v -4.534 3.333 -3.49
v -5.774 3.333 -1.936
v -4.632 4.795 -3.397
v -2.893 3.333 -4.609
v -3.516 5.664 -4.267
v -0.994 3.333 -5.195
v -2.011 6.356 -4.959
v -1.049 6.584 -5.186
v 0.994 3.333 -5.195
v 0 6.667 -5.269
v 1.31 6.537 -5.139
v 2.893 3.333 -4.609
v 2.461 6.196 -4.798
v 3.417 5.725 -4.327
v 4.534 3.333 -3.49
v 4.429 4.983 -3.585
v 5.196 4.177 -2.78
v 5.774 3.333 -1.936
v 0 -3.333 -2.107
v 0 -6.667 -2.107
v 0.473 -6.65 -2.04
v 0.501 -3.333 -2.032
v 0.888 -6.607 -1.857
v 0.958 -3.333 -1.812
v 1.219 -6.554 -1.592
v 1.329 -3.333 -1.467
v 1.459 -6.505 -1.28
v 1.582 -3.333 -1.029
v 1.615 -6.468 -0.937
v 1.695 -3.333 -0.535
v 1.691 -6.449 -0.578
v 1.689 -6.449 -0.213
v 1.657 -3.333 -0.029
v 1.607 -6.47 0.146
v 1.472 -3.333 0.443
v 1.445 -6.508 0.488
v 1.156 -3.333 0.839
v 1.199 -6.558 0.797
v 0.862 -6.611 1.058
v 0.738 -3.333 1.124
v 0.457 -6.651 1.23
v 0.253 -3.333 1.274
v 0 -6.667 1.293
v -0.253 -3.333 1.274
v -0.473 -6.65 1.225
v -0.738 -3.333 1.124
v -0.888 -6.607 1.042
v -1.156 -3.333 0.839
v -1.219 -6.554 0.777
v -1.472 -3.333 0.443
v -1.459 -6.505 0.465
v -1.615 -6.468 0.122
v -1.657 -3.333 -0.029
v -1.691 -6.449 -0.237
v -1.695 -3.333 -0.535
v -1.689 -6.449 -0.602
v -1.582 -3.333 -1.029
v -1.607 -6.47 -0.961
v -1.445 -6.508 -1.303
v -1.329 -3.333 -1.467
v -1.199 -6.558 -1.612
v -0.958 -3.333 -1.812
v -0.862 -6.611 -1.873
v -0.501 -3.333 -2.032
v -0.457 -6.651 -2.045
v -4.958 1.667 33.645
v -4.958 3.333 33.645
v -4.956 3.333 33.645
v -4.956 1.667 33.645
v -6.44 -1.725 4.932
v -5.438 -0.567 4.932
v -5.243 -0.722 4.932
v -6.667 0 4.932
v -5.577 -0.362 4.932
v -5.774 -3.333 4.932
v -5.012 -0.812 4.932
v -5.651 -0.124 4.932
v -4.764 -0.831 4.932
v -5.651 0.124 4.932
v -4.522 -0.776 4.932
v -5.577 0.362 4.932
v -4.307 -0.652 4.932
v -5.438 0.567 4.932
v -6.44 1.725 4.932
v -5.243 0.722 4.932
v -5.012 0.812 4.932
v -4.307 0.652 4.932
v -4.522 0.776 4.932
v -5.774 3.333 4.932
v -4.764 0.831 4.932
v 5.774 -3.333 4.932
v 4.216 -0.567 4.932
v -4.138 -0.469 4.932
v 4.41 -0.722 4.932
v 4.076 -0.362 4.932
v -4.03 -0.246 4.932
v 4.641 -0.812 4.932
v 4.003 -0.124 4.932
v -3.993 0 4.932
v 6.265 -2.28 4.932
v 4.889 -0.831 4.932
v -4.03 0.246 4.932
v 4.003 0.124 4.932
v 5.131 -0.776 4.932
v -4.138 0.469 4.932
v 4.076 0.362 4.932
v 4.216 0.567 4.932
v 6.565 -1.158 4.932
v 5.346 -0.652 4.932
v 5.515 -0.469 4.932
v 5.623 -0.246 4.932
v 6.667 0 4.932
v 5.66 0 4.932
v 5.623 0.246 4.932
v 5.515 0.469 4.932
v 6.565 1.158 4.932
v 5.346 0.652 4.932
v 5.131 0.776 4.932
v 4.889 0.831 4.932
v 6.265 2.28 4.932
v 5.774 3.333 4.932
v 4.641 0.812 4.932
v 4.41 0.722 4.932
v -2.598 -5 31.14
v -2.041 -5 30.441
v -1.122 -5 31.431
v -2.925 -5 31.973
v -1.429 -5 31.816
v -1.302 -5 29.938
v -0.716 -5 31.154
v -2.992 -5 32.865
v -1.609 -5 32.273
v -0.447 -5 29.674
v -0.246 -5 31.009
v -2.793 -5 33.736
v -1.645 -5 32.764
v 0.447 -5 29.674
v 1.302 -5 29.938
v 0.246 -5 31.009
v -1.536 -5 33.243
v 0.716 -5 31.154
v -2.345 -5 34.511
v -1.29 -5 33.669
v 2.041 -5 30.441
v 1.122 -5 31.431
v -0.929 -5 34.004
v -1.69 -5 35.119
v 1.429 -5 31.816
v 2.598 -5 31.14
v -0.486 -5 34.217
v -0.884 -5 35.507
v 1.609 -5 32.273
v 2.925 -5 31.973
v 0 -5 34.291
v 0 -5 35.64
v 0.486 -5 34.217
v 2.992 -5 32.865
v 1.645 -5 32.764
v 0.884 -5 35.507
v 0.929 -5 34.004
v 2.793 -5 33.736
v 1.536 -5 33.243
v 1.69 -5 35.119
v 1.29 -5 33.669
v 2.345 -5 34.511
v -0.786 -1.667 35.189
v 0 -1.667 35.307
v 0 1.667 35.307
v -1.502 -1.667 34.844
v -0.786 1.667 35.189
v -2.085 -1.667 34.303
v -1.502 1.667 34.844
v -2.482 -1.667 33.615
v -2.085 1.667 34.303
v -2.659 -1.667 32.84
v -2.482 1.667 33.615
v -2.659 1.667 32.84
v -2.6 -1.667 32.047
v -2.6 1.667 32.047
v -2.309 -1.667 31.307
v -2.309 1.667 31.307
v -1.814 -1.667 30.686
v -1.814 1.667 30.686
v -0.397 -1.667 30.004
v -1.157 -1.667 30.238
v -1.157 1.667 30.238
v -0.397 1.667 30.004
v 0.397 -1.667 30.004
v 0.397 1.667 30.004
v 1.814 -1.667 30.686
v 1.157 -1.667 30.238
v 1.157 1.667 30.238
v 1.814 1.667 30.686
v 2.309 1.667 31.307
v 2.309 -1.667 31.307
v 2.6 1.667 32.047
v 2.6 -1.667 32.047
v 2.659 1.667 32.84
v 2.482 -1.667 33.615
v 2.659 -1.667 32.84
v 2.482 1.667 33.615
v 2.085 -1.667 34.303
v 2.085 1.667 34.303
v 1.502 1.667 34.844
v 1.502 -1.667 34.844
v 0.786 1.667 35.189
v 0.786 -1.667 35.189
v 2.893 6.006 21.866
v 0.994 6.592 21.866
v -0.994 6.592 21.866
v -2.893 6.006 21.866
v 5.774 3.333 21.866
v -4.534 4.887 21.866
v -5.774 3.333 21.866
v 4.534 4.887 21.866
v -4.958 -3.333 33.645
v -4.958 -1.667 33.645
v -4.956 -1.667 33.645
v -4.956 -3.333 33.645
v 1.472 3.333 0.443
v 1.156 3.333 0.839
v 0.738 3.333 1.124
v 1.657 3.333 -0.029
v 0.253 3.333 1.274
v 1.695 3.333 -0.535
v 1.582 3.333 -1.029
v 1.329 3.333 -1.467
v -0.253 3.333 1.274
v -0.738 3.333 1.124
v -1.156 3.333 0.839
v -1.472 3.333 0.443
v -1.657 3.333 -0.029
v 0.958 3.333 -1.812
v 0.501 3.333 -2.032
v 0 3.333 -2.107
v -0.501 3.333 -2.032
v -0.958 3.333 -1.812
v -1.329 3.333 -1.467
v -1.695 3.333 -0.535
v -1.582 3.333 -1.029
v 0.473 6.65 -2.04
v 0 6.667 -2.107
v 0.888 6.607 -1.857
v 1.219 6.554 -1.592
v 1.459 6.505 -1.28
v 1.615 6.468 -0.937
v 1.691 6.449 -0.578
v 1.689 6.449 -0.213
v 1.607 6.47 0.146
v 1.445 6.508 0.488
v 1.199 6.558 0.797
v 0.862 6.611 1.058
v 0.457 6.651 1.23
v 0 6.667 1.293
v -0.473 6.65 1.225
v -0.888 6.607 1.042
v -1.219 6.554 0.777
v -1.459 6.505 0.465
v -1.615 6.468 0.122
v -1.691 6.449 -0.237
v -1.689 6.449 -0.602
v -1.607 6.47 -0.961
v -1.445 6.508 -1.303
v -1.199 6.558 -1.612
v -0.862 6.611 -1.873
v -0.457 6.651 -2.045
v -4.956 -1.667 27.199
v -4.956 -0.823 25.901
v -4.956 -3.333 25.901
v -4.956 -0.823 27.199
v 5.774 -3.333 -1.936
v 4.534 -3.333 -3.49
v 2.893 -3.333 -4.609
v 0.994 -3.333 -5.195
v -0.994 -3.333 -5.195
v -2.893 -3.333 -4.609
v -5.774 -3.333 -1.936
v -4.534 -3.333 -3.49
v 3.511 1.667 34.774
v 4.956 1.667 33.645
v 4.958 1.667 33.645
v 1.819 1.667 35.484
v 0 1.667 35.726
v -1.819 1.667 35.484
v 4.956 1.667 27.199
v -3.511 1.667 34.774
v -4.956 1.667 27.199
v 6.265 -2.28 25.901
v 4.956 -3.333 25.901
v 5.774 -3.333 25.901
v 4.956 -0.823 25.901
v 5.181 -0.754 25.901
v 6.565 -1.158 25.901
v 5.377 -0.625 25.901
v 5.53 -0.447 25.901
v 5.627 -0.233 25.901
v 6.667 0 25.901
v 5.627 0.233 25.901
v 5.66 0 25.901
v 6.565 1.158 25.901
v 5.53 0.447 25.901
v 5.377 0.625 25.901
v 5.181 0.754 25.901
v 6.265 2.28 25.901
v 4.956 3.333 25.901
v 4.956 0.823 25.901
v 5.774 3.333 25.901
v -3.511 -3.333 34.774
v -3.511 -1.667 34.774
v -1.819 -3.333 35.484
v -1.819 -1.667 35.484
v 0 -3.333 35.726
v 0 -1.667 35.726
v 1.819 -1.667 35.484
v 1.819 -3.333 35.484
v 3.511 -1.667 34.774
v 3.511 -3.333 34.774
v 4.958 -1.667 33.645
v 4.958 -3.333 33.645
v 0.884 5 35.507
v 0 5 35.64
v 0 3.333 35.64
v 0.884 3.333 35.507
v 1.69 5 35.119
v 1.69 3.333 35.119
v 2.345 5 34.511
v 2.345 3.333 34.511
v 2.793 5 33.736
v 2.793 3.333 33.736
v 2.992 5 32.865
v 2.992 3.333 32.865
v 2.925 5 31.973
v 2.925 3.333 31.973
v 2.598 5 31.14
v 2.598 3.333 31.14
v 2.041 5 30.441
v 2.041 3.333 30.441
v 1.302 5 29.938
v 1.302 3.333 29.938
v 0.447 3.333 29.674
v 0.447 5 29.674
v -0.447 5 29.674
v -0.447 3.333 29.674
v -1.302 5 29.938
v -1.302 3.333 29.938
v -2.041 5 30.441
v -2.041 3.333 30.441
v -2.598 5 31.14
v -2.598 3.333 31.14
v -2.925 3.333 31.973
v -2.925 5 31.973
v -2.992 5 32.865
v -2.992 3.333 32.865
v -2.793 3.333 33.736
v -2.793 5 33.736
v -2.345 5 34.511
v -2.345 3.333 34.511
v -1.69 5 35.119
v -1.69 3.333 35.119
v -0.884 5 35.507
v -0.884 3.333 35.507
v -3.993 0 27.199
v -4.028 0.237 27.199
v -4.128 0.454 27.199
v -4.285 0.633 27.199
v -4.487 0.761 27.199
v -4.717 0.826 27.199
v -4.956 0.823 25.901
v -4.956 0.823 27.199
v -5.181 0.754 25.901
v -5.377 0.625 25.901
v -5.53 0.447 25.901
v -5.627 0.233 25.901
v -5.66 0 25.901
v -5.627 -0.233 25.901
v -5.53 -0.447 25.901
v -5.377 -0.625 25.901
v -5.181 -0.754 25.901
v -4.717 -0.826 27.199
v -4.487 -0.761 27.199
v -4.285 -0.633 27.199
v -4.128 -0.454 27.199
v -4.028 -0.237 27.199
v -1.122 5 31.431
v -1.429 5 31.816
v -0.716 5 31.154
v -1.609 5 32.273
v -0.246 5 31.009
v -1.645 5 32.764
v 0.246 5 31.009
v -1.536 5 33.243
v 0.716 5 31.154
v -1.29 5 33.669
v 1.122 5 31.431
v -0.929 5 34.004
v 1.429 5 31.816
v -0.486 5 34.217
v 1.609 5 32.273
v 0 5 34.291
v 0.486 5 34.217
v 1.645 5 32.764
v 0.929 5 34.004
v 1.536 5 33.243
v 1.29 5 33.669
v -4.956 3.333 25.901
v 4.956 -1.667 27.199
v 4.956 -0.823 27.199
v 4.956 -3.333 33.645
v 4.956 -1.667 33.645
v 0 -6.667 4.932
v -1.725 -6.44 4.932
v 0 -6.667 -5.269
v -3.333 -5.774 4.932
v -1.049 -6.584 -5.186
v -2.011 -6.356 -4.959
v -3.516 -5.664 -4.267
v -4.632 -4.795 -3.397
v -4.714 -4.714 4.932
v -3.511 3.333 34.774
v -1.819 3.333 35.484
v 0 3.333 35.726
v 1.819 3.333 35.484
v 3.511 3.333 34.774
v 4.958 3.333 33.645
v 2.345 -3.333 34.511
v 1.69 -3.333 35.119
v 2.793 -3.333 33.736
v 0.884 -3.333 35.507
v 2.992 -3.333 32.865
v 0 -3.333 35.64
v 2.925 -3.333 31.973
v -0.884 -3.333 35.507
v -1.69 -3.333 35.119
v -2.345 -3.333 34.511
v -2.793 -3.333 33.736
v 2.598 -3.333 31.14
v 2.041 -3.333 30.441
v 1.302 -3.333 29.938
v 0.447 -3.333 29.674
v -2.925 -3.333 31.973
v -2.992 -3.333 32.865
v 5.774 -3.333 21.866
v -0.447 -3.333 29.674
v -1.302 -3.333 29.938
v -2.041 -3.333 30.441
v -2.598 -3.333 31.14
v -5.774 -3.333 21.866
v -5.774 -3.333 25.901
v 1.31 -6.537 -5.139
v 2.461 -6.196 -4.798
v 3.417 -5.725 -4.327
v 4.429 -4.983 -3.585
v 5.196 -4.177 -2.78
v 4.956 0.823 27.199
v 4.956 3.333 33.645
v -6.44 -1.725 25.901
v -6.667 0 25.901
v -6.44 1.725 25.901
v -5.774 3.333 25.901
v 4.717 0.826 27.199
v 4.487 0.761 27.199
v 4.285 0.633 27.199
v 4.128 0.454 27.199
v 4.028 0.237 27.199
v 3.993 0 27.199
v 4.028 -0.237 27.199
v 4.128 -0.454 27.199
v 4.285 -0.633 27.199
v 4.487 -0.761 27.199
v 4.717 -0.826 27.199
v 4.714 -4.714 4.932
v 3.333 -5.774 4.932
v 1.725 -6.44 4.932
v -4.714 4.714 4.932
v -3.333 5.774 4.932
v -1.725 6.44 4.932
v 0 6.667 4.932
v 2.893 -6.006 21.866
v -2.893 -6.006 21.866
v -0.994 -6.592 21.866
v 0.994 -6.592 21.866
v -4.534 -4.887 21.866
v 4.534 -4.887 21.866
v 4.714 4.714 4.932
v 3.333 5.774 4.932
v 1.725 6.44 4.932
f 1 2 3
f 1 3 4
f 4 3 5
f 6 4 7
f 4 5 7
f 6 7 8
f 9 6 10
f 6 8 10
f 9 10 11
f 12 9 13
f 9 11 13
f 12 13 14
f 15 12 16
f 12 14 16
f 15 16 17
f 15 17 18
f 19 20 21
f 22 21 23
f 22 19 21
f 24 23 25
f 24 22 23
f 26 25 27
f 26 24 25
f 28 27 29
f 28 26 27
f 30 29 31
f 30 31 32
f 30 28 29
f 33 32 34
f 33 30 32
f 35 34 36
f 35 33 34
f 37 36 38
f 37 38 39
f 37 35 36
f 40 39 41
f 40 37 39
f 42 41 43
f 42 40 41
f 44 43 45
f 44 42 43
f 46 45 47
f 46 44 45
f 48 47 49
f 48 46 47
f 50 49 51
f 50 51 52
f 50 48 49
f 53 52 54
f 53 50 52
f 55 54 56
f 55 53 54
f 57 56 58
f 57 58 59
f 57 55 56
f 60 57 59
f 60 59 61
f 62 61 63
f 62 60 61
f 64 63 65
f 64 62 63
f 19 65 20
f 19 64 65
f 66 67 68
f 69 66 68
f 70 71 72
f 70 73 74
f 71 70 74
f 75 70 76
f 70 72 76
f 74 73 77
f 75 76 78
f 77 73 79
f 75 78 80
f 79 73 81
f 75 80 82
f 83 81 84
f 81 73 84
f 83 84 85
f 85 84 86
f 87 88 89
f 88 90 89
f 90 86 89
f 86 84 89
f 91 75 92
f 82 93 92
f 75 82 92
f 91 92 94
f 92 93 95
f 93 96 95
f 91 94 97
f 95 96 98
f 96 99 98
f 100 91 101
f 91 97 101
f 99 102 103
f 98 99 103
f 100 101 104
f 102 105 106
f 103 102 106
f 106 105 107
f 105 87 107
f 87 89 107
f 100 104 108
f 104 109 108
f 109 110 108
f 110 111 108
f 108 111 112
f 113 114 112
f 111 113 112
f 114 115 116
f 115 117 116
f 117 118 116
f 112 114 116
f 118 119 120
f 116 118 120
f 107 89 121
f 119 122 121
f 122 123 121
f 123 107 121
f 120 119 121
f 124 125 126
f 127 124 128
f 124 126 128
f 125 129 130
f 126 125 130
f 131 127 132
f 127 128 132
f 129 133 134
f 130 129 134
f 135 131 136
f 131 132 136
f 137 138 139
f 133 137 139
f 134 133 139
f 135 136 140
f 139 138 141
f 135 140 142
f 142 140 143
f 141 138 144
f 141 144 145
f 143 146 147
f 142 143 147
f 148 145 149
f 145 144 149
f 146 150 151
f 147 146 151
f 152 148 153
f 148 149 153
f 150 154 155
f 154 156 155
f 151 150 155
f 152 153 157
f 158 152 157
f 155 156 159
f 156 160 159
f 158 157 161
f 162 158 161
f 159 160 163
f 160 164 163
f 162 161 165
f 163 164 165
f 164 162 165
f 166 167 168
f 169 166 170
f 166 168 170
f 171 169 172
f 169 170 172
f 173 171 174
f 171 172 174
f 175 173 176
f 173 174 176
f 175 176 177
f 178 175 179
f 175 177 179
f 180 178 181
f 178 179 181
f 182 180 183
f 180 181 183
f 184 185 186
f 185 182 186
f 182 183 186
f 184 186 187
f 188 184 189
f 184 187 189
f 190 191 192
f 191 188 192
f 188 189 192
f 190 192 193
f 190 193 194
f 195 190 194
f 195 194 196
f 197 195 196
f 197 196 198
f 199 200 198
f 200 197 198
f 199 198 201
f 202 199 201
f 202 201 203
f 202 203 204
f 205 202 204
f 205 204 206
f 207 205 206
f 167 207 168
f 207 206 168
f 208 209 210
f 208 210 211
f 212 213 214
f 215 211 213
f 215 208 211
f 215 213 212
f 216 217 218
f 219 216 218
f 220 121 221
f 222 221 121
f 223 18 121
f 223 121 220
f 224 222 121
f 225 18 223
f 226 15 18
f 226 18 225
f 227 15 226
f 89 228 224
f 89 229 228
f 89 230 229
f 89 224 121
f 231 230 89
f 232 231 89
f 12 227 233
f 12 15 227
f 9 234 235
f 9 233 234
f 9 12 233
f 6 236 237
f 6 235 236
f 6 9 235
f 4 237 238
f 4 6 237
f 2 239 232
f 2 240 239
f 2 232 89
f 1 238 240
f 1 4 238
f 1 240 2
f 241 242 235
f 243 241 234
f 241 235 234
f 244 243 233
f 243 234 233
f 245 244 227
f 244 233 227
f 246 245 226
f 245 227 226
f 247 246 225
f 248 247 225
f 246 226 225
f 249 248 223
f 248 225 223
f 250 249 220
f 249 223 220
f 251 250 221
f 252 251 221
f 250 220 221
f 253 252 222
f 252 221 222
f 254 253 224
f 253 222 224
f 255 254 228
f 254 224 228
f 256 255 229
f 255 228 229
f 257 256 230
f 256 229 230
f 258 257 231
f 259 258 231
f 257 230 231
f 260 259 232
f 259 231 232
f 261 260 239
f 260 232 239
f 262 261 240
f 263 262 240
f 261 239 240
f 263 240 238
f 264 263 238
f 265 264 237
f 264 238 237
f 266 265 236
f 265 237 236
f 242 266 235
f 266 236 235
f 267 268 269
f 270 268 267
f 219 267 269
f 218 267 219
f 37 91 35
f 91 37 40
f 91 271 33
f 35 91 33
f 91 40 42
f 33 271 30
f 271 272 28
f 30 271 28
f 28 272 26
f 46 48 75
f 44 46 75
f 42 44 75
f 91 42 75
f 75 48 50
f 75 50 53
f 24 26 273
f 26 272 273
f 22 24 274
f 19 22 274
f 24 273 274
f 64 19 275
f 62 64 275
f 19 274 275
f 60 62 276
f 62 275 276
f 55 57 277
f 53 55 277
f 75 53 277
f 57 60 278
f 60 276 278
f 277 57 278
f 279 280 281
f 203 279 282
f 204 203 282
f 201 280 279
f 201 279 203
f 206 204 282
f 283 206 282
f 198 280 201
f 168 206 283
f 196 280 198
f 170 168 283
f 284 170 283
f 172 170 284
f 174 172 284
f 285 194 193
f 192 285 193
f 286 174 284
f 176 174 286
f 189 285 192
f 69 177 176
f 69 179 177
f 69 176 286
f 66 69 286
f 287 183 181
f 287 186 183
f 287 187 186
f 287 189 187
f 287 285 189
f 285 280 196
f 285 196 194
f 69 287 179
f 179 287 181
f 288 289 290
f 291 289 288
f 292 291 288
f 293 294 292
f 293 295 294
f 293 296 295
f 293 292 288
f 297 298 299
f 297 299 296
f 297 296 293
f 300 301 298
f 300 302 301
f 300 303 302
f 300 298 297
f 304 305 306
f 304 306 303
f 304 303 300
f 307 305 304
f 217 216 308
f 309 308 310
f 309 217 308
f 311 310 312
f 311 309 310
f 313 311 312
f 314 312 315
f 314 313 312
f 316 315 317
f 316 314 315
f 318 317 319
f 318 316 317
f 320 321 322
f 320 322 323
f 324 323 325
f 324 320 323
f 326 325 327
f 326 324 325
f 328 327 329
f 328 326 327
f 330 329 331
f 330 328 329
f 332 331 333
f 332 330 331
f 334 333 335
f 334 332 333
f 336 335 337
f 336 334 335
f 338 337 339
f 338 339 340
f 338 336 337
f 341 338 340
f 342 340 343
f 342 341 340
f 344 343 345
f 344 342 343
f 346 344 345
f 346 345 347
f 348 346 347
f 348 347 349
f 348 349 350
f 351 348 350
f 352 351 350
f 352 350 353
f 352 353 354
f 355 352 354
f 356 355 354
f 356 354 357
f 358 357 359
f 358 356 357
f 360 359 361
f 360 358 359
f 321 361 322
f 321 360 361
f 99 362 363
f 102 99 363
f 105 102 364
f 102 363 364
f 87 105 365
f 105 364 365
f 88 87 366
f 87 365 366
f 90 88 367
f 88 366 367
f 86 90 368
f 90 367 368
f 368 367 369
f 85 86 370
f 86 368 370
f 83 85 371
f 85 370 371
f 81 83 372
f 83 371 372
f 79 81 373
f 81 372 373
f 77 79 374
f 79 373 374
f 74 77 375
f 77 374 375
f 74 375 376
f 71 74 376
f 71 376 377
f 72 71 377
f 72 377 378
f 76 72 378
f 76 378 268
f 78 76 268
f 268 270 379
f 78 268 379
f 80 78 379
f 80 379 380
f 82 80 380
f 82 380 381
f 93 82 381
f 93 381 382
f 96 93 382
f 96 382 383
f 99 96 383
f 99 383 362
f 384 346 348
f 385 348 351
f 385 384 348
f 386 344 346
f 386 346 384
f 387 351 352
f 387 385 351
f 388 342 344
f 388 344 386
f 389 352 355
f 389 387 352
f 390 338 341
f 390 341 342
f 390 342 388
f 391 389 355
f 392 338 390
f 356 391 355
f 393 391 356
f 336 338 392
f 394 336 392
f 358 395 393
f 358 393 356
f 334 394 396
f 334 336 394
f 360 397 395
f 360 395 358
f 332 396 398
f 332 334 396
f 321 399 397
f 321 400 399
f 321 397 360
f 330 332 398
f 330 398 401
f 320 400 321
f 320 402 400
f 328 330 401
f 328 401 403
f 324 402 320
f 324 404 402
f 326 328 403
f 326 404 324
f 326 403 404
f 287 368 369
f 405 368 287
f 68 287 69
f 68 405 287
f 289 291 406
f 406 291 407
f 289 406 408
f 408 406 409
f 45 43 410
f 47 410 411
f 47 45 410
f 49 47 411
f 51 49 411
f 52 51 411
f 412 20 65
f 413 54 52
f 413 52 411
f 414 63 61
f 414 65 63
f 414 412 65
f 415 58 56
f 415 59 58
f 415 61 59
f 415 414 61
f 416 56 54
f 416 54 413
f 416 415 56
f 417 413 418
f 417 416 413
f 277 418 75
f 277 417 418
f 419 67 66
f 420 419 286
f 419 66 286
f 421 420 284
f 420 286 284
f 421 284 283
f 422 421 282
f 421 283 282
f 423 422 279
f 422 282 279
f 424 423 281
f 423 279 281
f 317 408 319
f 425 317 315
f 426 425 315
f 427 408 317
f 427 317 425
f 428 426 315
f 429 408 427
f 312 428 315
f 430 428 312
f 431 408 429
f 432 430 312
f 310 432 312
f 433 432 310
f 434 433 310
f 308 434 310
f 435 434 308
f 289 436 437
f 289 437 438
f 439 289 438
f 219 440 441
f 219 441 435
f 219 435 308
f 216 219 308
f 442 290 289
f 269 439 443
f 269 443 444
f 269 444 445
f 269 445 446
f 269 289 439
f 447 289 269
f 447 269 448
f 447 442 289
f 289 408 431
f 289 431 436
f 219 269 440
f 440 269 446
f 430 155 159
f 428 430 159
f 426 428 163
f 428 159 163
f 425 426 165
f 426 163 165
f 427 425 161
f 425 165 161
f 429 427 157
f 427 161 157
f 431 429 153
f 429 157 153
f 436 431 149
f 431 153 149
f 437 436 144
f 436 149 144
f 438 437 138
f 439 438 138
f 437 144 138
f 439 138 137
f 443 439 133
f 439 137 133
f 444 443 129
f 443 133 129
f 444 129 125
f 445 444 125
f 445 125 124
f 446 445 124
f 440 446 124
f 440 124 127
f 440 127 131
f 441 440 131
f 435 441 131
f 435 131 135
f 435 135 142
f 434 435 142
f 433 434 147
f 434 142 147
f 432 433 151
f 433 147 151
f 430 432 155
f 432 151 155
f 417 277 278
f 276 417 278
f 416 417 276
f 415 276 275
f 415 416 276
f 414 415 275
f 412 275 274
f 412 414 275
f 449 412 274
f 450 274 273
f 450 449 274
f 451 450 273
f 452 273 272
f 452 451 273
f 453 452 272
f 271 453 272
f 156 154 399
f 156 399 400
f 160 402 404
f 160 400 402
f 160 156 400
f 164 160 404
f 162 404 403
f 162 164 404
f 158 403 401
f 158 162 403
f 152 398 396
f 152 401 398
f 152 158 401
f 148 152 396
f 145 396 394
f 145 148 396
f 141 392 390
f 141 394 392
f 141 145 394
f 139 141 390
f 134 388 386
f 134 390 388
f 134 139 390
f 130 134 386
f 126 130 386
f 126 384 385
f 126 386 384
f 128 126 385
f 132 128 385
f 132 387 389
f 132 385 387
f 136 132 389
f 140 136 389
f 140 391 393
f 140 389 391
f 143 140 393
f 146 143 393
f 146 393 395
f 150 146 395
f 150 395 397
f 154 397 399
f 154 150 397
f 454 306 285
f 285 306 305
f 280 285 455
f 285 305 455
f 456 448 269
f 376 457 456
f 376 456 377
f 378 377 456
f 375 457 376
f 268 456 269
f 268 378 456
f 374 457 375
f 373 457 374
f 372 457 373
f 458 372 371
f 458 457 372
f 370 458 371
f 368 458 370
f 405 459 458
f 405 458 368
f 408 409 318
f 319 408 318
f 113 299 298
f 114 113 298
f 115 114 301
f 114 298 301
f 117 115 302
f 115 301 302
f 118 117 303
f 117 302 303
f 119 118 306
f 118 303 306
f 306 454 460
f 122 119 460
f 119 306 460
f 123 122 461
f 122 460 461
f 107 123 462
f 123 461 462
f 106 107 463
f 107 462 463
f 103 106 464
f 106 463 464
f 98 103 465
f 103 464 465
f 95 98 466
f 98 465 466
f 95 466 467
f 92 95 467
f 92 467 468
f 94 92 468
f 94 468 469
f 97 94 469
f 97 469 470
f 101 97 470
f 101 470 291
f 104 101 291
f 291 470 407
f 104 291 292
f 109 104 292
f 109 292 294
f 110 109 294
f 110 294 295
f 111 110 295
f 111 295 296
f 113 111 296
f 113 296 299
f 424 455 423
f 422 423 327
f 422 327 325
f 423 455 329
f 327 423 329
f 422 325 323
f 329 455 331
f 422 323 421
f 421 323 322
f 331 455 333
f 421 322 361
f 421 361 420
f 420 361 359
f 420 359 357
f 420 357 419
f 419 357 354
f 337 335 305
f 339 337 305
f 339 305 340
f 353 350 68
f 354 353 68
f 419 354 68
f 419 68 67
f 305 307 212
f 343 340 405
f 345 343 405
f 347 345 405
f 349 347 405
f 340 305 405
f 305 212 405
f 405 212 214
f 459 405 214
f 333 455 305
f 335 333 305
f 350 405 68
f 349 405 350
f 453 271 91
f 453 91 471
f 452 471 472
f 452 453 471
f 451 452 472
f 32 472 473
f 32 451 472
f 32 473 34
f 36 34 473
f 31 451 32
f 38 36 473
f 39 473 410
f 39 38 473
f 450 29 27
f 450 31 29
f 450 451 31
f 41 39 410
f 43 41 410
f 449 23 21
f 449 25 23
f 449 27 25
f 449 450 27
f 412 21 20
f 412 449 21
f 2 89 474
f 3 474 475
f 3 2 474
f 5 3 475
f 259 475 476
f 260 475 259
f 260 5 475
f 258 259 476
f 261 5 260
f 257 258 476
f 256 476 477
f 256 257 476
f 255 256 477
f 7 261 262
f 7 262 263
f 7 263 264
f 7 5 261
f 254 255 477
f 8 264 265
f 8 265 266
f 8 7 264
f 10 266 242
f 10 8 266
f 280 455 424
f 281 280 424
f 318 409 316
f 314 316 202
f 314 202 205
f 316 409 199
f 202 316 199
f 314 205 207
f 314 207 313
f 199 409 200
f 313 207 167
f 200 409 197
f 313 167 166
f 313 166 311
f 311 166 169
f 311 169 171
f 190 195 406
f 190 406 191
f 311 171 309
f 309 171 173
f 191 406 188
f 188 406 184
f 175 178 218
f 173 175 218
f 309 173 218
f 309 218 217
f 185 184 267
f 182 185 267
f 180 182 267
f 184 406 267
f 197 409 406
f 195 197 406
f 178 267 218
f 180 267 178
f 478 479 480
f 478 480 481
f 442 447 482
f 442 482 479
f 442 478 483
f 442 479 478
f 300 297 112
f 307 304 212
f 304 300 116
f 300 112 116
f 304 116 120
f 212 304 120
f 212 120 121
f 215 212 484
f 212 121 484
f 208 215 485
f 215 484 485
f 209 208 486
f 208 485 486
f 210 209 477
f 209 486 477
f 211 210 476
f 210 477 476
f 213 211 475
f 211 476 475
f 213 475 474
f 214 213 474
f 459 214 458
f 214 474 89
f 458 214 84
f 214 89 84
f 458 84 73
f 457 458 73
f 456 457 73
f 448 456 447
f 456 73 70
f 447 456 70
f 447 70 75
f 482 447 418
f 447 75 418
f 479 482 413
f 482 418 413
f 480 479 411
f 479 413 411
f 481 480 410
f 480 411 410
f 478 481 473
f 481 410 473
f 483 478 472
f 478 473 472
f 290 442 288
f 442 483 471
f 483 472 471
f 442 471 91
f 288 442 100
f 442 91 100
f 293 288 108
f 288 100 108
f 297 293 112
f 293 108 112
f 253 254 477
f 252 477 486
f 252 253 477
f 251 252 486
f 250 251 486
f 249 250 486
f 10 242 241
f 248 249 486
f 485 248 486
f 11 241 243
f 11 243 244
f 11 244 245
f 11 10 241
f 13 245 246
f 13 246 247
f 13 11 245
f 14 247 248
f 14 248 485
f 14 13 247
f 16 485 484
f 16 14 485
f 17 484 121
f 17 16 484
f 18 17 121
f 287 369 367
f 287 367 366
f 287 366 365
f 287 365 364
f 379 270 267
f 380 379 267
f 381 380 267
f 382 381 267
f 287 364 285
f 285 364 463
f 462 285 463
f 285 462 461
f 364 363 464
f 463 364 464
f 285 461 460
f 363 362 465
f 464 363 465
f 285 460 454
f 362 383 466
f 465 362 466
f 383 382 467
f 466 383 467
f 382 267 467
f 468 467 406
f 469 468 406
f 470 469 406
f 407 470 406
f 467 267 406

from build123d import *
from build123d.topology import SkipClean

# Parameters (mm, degrees)
SKETCH2_R                       = 10
PHALANGE_LENGTH_DEPTH           = 33.4
BOSS_EXTRUDE3_DEPTH             = 5
BOSS_EXTRUDE4_DEPTH             = 5
BOSS_EXTRUDE4_DEPTH_BACK        = 5
CUT_EXTRUDE2_START              = -15.3025
CUT_EXTRUDE2_DEPTH              = 15.3025
SKETCH7_R                       = 1.65
CUT_EXTRUDE3_DEPTH              = 10
CUT_EXTRUDE4_DEPTH              = 2.5
CUT_EXTRUDE4_DEPTH_BACK         = 2.5
CUT_EXTRUDE7_REACH              = 53.978
SKETCH4_R                       = 1.65
CUT_EXTRUDE7_DIRECTION_2_REACH  = 53.978
CUT_EXTRUDE_THIN1_START         = 33.4
CUT_EXTRUDE_THIN1_DEPTH         = 10.361670454
BOSS_EXTRUDE5_REACH             = 53.313
SKETCH9_R                       = 4
SKETCH9_R_2                     = 1.65
CUT_EXTRUDE8_REACH              = 52.714
SKETCH10_R                      = 1.25
CUT_EXTRUDE9_START              = -8
CUT_EXTRUDE9_DEPTH              = 8
CUT_EXTRUDE10_REACH             = 53.313
CUT_EXTRUDE10_DIRECTION_2_REACH = 53.313
CUT_EXTRUDE11_START             = -10
CUT_EXTRUDE11_OUTLINE_W         = 2.565773848
CUT_EXTRUDE11_OUTLINE_H         = 11.6166929
CUT_EXTRUDE11_DEPTH             = 10
BOSS_EXTRUDE6_START             = 7.5
SKETCH14_R                      = 4.5
SKETCH14_R_2                    = 1.65
BOSS_EXTRUDE6_DEPTH             = 2.5
BOSS_EXTRUDE7_START             = -7.5
SKETCH14_2_R                    = 4.5
SKETCH14_2_R_2                  = 1.65
BOSS_EXTRUDE7_DEPTH             = 2.5
SCALE1_SCALE                    = 0.666666667
CUT_EXTRUDE12_START             = -11.666667
SKETCH15_R                      = 1.65
CUT_EXTRUDE12_DEPTH             = 13.333339
CUT_EXTRUDE13_REACH             = 39.694
SKETCH16_R                      = 1.7
CUT_EXTRUDE13_DIRECTION_2_REACH = 39.694


# Read off the part's stored shape, not the designer's step: Cut-Extrude-Thin1, Cut-Extrude11
with BuildPart() as part:
    # Sketch2 → Phalange Length (new body)
    with BuildSketch(Plane.XY):
        Circle(SKETCH2_R)
    extrude(amount=PHALANGE_LENGTH_DEPTH)

    # Sketch3 → Boss-Extrude3 (add)
    with BuildSketch(Plane(origin=(0, -10, 0), x_dir=(-1, 0, 0), z_dir=(0, -1, 0))):
        with BuildLine():
            Line((-10, 5.302499701), (-10, 0))
            Line((-10, 0), (10, 0))
            Line((10, 0), (10, 5.302499701))
            ThreePointArc((10, 5.302499701), (0, 15.302499701), (-10, 5.302499701))
        make_face()
    boss_extrude3 = extrude(amount=-BOSS_EXTRUDE3_DEPTH)

    # Mirror1: Boss-Extrude3 across plane
    add(boss_extrude3.mirror(Plane.ZX))

    # Sketch5 → Boss-Extrude4 (add, two sides: drawn at the far end of the back side and taken through both)
    with BuildSketch(Plane(origin=(0, 0, 0), x_dir=(1, 0, 0), z_dir=(0, 1, 0)).offset(-BOSS_EXTRUDE4_DEPTH_BACK)):
        with BuildLine():
            Line((-10, -39.183157911), (-10, -33.4))
            Line((-10, -33.4), (10, -33.4))
            Line((10, -33.4), (10, -39.183157911))
            ThreePointArc((10, -39.183157911), (0, -48.751984156), (-10, -39.183157911))
        make_face()
    extrude(amount=BOSS_EXTRUDE4_DEPTH + BOSS_EXTRUDE4_DEPTH_BACK)

    # Sketch6 → Cut-Extrude2 (cut)
    with SkipClean():  # the faces are left unmerged after this step: merging them gives an invalid solid
        with BuildSketch(Plane.XY.offset(CUT_EXTRUDE2_START)):
            with BuildLine():
                ThreePointArc((0, 10), (5, 8.660254038), (8.660254038, 5))
                Line((8.660254038, 5), (10, 5))
                Line((10, 5), (10, 10))
                Line((10, 10), (0, 10))
            make_face()
            with BuildLine():
                Line((10, -5), (8.660254038, -5))
                ThreePointArc((8.660254038, -5), (5, -8.660254038), (0, -10))
                Line((0, -10), (10, -10))
                Line((10, -10), (10, -5))
            make_face()
            with BuildLine():
                ThreePointArc((-8.660254038, 5), (-5, 8.660254038), (0, 10))
                Line((0, 10), (-10, 10))
                Line((-10, 10), (-10, 5))
                Line((-10, 5), (-8.660254038, 5))
            make_face()
            with BuildLine():
                Line((-10, -10), (0, -10))
                ThreePointArc((0, -10), (-5, -8.660254038), (-8.660254038, -5))
                Line((-8.660254038, -5), (-10, -5))
                Line((-10, -5), (-10, -10))
            make_face()
        extrude(amount=CUT_EXTRUDE2_DEPTH, mode=Mode.SUBTRACT)

    # Sketch7 → Cut-Extrude3 (cut)
    with SkipClean():  # the faces are left unmerged after this step: merging them gives an invalid solid
        with BuildSketch(Plane(origin=(0, 5, 0), x_dir=(1, 0, 0), z_dir=(0, 1, 0))):
            with Locations(Location((0, -41.561984156, 0), (0, 0, 270))):
                Circle(SKETCH7_R)
        extrude(amount=-CUT_EXTRUDE3_DEPTH, mode=Mode.SUBTRACT)

    # Sketch5<2> → Cut-Extrude4 (cut, two sides: drawn at the far end of the back side and taken through both)
    with BuildSketch(Plane(origin=(0, 0, 0), x_dir=(1, 0, 0), z_dir=(0, 1, 0)).offset(-CUT_EXTRUDE4_DEPTH_BACK)):
        with BuildLine():
            Line((-10, -39.183157911), (-10, -33.4))
            Line((-10, -33.4), (10, -33.4))
            Line((10, -33.4), (10, -39.183157911))
            ThreePointArc((10, -39.183157911), (0, -48.751984156), (-10, -39.183157911))
        make_face()
    extrude(amount=CUT_EXTRUDE4_DEPTH + CUT_EXTRUDE4_DEPTH_BACK, mode=Mode.SUBTRACT)

    # Sketch4 → Cut-Extrude7 (cut, up to next)
    with BuildSketch(Plane(origin=(0, -5, 0), x_dir=(1, 0, 0), z_dir=(0, 1, 0)), mode=Mode.PRIVATE) as cut_extrude7_sk1:
        with Locations(Location((0, 8.010159673, 0), (0, 0, 270))):
            Circle(SKETCH4_R)
    cut_extrude7_tool1 = extrude(cut_extrude7_sk1.sketch, amount=-CUT_EXTRUDE7_REACH, mode=Mode.PRIVATE) & part.part
    add(cut_extrude7_tool1.solids().sort_by_distance((0, -5, -8.01016))[0], mode=Mode.SUBTRACT)

    # Sketch4 → Cut-Extrude7 direction 2 (cut, up to next)
    with BuildSketch(Plane(origin=(0, -5, 0), x_dir=(1, 0, 0), z_dir=(0, 1, 0)), mode=Mode.PRIVATE) as cut_extrude7_direction_2_sk1:
        with Locations(Location((0, 8.010159673, 0), (0, 0, 270))):
            Circle(SKETCH4_R)
    cut_extrude7_direction_2_tool1 = extrude(cut_extrude7_direction_2_sk1.sketch, amount=CUT_EXTRUDE7_DIRECTION_2_REACH, mode=Mode.PRIVATE) & part.part
    add(cut_extrude7_direction_2_tool1.solids().sort_by_distance((0, -5, -8.01016))[0], mode=Mode.SUBTRACT)

    # Cut-Extrude-Thin1 outline → Cut-Extrude-Thin1 (cut)
    with SkipClean():  # the faces are left unmerged after this step: merging them gives an invalid solid
        with BuildSketch(Plane.XY.offset(CUT_EXTRUDE_THIN1_START)):
            with BuildLine():
                ThreePointArc((8.660254038, 5), (9.256147934, 3.78466979), (9.682458366, 2.5))
                Line((9.682458366, 2.5), (10, 2.5))
                Line((10, 2.5), (10, 5))
                Line((10, 5), (8.660254038, 5))
            make_face()
            with BuildLine():
                Line((10, -2.5), (9.682458366, -2.5))
                ThreePointArc((9.682458366, -2.5), (9.256147934, -3.78466979), (8.660254038, -5))
                Line((8.660254038, -5), (10, -5))
                Line((10, -5), (10, -2.5))
            make_face()
            with BuildLine():
                Line((-10, 2.5), (-9.682458366, 2.5))
                ThreePointArc((-9.682458366, 2.5), (-9.256147934, 3.78466979), (-8.660254038, 5))
                Line((-8.660254038, 5), (-10, 5))
                Line((-10, 5), (-10, 2.5))
            make_face()
            with BuildLine():
                ThreePointArc((-8.660254038, -5), (-9.256147934, -3.78466979), (-9.682458366, -2.5))
                Line((-9.682458366, -2.5), (-10, -2.5))
                Line((-10, -2.5), (-10, -5))
                Line((-10, -5), (-8.660254038, -5))
            make_face()
        extrude(amount=CUT_EXTRUDE_THIN1_DEPTH, mode=Mode.SUBTRACT)

    # Sketch9 → Boss-Extrude5 (add, up to next)
    with BuildSketch(Plane.XZ.offset(-2.5), mode=Mode.PRIVATE) as boss_extrude5_sk1:
        with Locations(Location((0, 41.561984156, 0), (0, 0, 90))):
            Circle(SKETCH9_R)
        with Locations(Location((0, 41.561984156, 0), (0, 0, 90))):
            Circle(SKETCH9_R_2, mode=Mode.SUBTRACT)
    boss_extrude5_tool1 = extrude(boss_extrude5_sk1.sketch, amount=BOSS_EXTRUDE5_REACH, mode=Mode.PRIVATE) - part.part
    add(boss_extrude5_tool1.solids().sort_by_distance((0, 2.5, 37.675121))[0])

    # Sketch10 → Cut-Extrude8 (cut, up to next)
    with BuildSketch(Plane.XY.offset(33.4), mode=Mode.PRIVATE) as cut_extrude8_sk1:
        with Locations((7.239961745, 0)):
            Circle(SKETCH10_R)
    cut_extrude8_tool1 = extrude(cut_extrude8_sk1.sketch, amount=-CUT_EXTRUDE8_REACH, mode=Mode.PRIVATE) & part.part
    # Sketch10 → Cut-Extrude8 (cut, up to next)
    with BuildSketch(Plane.XY.offset(33.4), mode=Mode.PRIVATE) as cut_extrude8_sk2:
        with Locations((-7.239961745, 0)):
            Circle(SKETCH10_R)
    cut_extrude8_tool2 = extrude(cut_extrude8_sk2.sketch, amount=-CUT_EXTRUDE8_REACH, mode=Mode.PRIVATE) & part.part
    add(cut_extrude8_tool1.solids().sort_by_distance((7.239962, 0, 33.4))[0], mode=Mode.SUBTRACT)
    add(cut_extrude8_tool2.solids().sort_by_distance((-7.239962, 0, 33.4))[0], mode=Mode.SUBTRACT)

    # Sketch11 → Cut-Extrude9 (cut)
    with SkipClean():  # the faces are left unmerged after this step: merging them gives an invalid solid
        with BuildSketch(Plane.XY.offset(33.4).offset(CUT_EXTRUDE9_START)):
            with BuildLine():
                ThreePointArc((8.660254038, 5), (0, 10), (-8.660254038, 5))
                Line((-8.660254038, 5), (8.660254038, 5))
            make_face()
            with BuildLine():
                Line((8.660254038, -5), (-8.660254038, -5))
                ThreePointArc((-8.660254038, -5), (0, -10), (8.660254038, -5))
            make_face()
        extrude(amount=CUT_EXTRUDE9_DEPTH, mode=Mode.SUBTRACT)

    # Sketch12 → Cut-Extrude10 (cut, up to next)
    with BuildSketch(Plane.XZ.offset(-2.5), mode=Mode.PRIVATE) as cut_extrude10_sk1:
        with BuildLine():
            Line((-10.033719202, 48.751984156), (-10.033719202, 41.564892021))
            Line((-10.033719202, 41.564892021), (-8.660254038, 41.564892021))
            ThreePointArc((-8.660254038, 41.564892021), (0, 46.190740593), (8.660254038, 41.564892021))
            Line((8.660254038, 41.564892021), (10.033719202, 41.564892021))
            Line((10.033719202, 41.564892021), (10.033719202, 48.751984156))
            Line((10.033719202, 48.751984156), (-10.033719202, 48.751984156))
        make_face()
    cut_extrude10_tool1 = extrude(cut_extrude10_sk1.sketch, amount=CUT_EXTRUDE10_REACH, mode=Mode.PRIVATE) & part.part
    add(cut_extrude10_tool1.solids().sort_by_distance((0, 2.5, 46.250279))[0], mode=Mode.SUBTRACT)

    # Sketch12 → Cut-Extrude10 direction 2 (cut, up to next)
    with BuildSketch(Plane.XZ.offset(-2.5), mode=Mode.PRIVATE) as cut_extrude10_direction_2_sk1:
        with BuildLine():
            Line((-10.033719202, 48.751984156), (-10.033719202, 41.564892021))
            Line((-10.033719202, 41.564892021), (-8.660254038, 41.564892021))
            ThreePointArc((-8.660254038, 41.564892021), (0, 46.190740593), (8.660254038, 41.564892021))
            Line((8.660254038, 41.564892021), (10.033719202, 41.564892021))
            Line((10.033719202, 41.564892021), (10.033719202, 48.751984156))
            Line((10.033719202, 48.751984156), (-10.033719202, 48.751984156))
        make_face()
    cut_extrude10_direction_2_tool1 = extrude(cut_extrude10_direction_2_sk1.sketch, amount=-CUT_EXTRUDE10_DIRECTION_2_REACH, mode=Mode.PRIVATE) & part.part
    add(cut_extrude10_direction_2_tool1.solids().sort_by_distance((0, 2.5, 46.250279))[0], mode=Mode.SUBTRACT)

    # Cut-Extrude11 outline → Cut-Extrude11 (cut)
    with BuildSketch(Plane.XZ.offset(5).offset(CUT_EXTRUDE11_START)):
        with Locations((-8.717113076, 37.260571369)):
            Rectangle(CUT_EXTRUDE11_OUTLINE_W, CUT_EXTRUDE11_OUTLINE_H)
        with Locations((8.717113076, 37.260571369)):
            Rectangle(CUT_EXTRUDE11_OUTLINE_W, CUT_EXTRUDE11_OUTLINE_H)
    extrude(amount=CUT_EXTRUDE11_DEPTH, mode=Mode.SUBTRACT)

    # Sketch14 → Boss-Extrude6 (add)
    with SkipClean():  # the faces are left unmerged after this step: merging them gives an invalid solid
        with BuildSketch(Plane(origin=(0, 0, 0), x_dir=(1, 0, 0), z_dir=(0, 1, 0)).offset(BOSS_EXTRUDE6_START)):
            with Locations(Location((0, -41.561984156, 0), (0, 0, 270))):
                Circle(SKETCH14_R)
            with Locations(Location((0, -41.561984156, 0), (0, 0, 270))):
                Circle(SKETCH14_R_2, mode=Mode.SUBTRACT)
        extrude(amount=-BOSS_EXTRUDE6_DEPTH)

    # Sketch14<2> → Boss-Extrude7 (add)
    with SkipClean():  # the faces are left unmerged after this step: merging them gives an invalid solid
        with BuildSketch(Plane(origin=(0, 0, 0), x_dir=(1, 0, 0), z_dir=(0, 1, 0)).offset(BOSS_EXTRUDE7_START)):
            with Locations(Location((0, -41.561984156, 0), (0, 0, 270))):
                Circle(SKETCH14_2_R)
            with Locations(Location((0, -41.561984156, 0), (0, 0, 270))):
                Circle(SKETCH14_2_R_2, mode=Mode.SUBTRACT)
        extrude(amount=BOSS_EXTRUDE7_DEPTH)


with BuildPart() as part_1:
    # Scale1: scaled about (1e-09, 6.5e-08, 14.797343539)
    add(part.part.scale(SCALE1_SCALE).moved(Location((0, 2.2e-08, 4.932447846))))

    # Sketch15 → Cut-Extrude12 (cut)
    with BuildSketch(Plane(origin=(0, 4.999995016, 0), x_dir=(1, 0, 0), z_dir=(0, 1, 0)).offset(CUT_EXTRUDE12_START)):
        with Locations(Location((-8e-09, -32.640597832, 0), (0, 0, 270))):
            Circle(SKETCH15_R)
    extrude(amount=CUT_EXTRUDE12_DEPTH, mode=Mode.SUBTRACT)

    # Sketch16 → Cut-Extrude13 (cut, up to next)
    with BuildSketch(Plane.XZ.offset(-3.33332835), mode=Mode.PRIVATE) as cut_extrude13_sk1:
        with Locations(Location((-8e-09, -0.407498054, 0), (0, 0, 270))):
            Circle(SKETCH16_R)
    cut_extrude13_tool1 = extrude(cut_extrude13_sk1.sketch, amount=-CUT_EXTRUDE13_REACH, mode=Mode.PRIVATE) & part_1.part
    add(cut_extrude13_tool1.solids().sort_by_distance((0, 3.333328, -0.407498))[0], mode=Mode.SUBTRACT)

    # Sketch16 → Cut-Extrude13 direction 2 (cut, up to next)
    with BuildSketch(Plane.XZ.offset(-3.33332835), mode=Mode.PRIVATE) as cut_extrude13_direction_2_sk1:
        with Locations(Location((-8e-09, -0.407498054, 0), (0, 0, 270))):
            Circle(SKETCH16_R)
    cut_extrude13_direction_2_tool1 = extrude(cut_extrude13_direction_2_sk1.sketch, amount=CUT_EXTRUDE13_DIRECTION_2_REACH, mode=Mode.PRIVATE) & part_1.part
    add(cut_extrude13_direction_2_tool1.solids().sort_by_distance((0, 3.333328, -0.407498))[0], mode=Mode.SUBTRACT)


solid = part_1.part
